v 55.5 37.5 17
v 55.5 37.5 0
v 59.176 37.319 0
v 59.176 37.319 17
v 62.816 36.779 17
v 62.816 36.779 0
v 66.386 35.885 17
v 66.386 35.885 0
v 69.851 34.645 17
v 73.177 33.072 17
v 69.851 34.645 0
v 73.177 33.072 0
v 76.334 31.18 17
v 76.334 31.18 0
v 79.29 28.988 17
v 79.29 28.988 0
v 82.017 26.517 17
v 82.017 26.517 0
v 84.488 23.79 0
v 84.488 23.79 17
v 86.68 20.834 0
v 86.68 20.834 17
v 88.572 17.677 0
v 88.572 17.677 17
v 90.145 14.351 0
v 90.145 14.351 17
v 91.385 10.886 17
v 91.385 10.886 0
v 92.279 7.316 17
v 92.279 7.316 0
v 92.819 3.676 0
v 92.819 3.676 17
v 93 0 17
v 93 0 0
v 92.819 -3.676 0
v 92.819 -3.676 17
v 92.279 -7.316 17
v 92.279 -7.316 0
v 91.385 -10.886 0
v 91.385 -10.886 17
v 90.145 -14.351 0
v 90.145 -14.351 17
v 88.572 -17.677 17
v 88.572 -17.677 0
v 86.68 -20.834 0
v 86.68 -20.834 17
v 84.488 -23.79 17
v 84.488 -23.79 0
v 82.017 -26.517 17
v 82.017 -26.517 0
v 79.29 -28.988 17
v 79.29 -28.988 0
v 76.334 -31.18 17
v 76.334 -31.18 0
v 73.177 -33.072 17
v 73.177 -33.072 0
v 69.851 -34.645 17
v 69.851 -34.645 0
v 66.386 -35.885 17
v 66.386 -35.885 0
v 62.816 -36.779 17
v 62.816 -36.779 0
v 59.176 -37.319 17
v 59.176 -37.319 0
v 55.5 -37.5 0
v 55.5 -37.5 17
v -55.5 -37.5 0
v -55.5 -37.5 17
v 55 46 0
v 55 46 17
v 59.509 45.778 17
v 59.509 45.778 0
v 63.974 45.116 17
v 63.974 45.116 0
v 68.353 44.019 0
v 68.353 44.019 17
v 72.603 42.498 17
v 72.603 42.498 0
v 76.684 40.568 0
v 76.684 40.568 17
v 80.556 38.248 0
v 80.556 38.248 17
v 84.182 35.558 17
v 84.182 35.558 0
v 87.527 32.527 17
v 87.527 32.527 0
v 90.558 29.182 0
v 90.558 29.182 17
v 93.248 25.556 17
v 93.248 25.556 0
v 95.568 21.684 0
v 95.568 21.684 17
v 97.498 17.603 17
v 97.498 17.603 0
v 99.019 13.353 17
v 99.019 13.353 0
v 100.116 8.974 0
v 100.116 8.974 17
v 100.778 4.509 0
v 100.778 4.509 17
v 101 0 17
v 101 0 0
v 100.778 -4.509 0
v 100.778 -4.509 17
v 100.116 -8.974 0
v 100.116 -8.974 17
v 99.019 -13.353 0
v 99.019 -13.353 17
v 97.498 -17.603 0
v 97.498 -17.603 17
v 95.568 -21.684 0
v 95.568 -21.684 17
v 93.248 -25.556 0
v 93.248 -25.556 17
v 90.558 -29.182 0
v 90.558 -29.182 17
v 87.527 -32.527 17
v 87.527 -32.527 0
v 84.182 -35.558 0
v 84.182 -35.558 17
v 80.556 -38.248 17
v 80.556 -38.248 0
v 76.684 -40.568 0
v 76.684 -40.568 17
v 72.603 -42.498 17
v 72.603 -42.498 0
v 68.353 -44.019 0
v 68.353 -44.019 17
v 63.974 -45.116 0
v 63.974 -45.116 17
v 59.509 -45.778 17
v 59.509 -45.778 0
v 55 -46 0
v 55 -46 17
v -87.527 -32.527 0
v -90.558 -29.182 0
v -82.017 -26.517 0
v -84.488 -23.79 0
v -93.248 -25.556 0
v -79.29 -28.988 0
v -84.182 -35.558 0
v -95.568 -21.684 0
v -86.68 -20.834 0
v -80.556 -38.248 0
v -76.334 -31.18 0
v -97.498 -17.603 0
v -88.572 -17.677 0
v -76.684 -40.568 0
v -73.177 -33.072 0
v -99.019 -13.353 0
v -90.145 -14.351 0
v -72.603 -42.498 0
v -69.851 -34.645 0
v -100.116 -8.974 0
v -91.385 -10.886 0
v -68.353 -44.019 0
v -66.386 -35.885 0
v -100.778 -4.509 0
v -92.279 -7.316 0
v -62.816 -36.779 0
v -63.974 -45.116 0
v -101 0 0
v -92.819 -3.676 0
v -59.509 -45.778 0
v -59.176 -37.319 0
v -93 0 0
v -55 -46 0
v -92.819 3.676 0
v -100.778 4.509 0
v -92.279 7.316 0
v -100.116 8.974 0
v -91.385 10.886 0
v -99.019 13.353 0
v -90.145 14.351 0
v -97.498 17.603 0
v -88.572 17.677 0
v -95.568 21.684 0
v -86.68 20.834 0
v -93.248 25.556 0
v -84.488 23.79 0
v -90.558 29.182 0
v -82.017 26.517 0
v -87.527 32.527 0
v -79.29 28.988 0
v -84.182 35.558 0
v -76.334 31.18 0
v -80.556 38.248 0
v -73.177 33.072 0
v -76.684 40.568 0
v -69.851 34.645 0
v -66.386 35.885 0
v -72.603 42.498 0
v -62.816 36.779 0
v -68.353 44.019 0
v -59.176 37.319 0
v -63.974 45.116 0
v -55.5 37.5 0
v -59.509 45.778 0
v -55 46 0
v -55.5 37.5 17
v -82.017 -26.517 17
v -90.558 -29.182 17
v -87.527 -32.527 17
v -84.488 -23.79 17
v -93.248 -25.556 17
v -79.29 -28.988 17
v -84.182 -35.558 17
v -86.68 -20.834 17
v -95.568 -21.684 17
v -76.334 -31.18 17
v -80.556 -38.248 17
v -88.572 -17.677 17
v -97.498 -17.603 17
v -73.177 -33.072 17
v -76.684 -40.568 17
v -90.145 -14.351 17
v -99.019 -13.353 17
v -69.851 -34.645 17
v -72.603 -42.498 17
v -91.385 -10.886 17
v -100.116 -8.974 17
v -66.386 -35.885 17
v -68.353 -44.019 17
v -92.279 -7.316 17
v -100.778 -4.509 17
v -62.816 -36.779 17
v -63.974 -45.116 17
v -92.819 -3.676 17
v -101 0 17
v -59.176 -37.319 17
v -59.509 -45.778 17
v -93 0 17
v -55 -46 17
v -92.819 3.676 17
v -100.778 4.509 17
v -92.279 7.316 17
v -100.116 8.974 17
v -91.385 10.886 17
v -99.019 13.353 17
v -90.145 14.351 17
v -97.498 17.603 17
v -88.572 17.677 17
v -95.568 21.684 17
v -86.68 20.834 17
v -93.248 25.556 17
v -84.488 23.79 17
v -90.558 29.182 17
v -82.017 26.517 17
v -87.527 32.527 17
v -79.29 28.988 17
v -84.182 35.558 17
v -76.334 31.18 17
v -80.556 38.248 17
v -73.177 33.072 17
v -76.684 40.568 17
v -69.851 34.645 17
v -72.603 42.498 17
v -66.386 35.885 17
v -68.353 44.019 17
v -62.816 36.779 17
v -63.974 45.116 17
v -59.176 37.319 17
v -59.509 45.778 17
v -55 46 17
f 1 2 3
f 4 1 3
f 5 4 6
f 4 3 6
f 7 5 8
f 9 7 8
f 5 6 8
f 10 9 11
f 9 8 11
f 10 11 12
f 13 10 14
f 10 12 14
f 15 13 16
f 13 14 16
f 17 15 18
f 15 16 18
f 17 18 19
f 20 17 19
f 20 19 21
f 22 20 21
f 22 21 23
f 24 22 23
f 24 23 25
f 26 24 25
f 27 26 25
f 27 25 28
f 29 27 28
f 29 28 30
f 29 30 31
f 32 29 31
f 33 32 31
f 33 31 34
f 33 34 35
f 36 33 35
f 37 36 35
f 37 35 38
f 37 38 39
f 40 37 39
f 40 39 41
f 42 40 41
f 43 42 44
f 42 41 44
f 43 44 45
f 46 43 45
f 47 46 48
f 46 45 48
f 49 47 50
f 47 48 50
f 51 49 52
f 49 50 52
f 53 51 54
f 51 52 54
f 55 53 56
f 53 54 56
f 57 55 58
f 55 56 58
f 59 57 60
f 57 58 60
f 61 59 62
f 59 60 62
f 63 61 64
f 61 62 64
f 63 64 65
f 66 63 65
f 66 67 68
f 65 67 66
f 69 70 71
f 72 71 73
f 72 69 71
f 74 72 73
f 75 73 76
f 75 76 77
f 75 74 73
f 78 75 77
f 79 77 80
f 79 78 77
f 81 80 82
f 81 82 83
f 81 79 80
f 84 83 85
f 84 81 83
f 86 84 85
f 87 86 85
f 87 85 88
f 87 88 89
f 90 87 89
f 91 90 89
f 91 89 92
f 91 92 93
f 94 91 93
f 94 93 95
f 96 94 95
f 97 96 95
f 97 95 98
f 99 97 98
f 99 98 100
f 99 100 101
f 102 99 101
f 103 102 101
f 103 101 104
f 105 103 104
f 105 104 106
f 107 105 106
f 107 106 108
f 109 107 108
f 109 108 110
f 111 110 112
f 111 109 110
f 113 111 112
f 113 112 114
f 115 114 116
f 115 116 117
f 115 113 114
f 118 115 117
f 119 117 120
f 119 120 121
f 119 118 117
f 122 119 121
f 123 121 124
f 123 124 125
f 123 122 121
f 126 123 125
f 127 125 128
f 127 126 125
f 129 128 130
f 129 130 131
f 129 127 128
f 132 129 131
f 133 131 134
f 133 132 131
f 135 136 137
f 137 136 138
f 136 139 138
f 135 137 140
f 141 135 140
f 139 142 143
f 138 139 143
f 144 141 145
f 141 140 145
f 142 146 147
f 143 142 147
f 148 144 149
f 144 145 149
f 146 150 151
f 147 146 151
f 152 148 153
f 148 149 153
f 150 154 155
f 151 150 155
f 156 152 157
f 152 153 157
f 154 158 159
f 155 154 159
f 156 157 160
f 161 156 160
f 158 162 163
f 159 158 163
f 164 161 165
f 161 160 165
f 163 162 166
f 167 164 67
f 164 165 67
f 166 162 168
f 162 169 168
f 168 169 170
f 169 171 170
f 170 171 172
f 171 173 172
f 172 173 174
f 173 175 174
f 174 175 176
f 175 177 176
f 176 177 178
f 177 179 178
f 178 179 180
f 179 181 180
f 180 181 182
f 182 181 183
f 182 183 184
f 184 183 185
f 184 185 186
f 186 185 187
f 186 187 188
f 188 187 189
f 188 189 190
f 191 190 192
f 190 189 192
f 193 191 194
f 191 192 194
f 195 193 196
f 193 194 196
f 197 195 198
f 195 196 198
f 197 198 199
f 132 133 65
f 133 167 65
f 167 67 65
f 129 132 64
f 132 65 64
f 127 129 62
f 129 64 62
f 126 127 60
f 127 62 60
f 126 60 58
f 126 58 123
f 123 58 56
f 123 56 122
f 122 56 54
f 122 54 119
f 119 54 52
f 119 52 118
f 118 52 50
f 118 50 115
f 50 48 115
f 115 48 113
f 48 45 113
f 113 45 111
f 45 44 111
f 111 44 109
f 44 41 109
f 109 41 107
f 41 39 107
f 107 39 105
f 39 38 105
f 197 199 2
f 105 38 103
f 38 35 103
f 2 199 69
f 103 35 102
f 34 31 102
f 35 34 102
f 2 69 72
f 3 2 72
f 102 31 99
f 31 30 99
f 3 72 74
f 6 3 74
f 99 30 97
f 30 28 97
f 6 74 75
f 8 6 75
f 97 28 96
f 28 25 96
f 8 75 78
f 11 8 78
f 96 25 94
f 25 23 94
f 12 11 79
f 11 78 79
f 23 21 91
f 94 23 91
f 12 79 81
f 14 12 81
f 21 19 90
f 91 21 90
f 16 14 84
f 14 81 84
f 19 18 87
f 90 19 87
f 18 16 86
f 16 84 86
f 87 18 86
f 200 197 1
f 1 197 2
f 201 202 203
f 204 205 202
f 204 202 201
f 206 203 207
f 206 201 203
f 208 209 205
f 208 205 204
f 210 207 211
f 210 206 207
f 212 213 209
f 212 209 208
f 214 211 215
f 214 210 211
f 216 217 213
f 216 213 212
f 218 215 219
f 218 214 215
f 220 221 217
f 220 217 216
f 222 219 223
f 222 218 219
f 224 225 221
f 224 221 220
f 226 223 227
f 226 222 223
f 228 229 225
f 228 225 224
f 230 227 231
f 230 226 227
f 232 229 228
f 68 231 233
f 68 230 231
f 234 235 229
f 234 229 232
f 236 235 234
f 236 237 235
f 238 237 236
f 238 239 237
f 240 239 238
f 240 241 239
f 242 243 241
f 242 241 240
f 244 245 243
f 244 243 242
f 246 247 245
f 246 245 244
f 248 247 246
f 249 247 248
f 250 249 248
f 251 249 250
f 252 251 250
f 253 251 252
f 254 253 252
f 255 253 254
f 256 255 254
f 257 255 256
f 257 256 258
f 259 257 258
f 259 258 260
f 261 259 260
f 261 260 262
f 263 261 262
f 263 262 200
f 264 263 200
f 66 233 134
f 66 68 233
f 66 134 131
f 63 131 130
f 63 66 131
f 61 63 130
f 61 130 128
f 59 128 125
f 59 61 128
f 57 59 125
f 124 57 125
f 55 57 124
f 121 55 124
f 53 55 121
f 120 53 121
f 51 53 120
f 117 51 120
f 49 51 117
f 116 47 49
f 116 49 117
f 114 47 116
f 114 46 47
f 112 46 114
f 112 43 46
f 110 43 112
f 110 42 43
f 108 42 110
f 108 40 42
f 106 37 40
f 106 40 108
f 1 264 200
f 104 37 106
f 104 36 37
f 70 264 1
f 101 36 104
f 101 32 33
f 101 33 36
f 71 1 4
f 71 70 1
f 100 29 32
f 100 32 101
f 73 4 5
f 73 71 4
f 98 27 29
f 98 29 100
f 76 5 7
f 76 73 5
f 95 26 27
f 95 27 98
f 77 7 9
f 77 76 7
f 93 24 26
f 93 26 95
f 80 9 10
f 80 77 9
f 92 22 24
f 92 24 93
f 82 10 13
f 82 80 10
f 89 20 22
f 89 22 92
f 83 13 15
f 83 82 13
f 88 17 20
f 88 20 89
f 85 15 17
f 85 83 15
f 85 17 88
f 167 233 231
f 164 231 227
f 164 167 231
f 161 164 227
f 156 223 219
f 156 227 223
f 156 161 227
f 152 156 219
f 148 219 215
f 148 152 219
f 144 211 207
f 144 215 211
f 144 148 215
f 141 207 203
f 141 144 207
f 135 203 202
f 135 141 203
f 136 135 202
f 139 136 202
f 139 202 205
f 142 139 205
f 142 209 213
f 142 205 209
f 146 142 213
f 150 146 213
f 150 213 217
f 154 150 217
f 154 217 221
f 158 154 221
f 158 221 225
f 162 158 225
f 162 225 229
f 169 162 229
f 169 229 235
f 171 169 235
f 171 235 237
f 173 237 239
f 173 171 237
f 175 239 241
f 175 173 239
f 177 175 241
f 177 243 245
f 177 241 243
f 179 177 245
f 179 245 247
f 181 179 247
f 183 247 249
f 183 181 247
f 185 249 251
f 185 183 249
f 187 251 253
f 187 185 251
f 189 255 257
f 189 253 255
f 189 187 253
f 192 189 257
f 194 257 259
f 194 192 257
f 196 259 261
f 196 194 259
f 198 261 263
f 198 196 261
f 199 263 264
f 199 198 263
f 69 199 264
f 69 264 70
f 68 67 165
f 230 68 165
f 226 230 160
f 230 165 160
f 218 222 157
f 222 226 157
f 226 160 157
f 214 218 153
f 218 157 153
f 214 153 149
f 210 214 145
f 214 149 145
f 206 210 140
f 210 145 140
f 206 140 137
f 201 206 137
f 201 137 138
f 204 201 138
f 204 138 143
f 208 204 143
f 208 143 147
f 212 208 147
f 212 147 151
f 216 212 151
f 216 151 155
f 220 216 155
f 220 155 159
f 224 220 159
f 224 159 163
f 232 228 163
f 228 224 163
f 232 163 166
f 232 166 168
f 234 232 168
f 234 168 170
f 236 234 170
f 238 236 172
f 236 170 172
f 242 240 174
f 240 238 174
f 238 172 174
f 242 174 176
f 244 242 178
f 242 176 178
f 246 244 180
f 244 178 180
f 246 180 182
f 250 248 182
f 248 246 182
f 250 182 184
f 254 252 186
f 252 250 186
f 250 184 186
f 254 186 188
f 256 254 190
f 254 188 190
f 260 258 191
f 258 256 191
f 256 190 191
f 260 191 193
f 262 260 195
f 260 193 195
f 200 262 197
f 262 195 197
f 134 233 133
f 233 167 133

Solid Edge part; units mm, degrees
sketch "Sketch1" plane through (0, 0, 0) normal (0, 0, 1) x (1, 0, 0)
  line L0 (-55, -46) -> (55, -46)
  arc A0 (55, 46) -> (55, -46) centre (55, 0) cw
  line L1 (-55, 46) -> (55, 46)
  arc A1 (-55, 46) -> (-55, -46) centre (-55, 0) ccw
  line L2 (-55.5, 37.5) -> (55.5, 37.5)
  arc A2 (55.5, 37.5) -> (55.5, -37.5) centre (55.5, 0) cw
  line L3 (-55.5, -37.5) -> (55.5, -37.5)
  arc A3 (-55.5, 37.5) -> (-55.5, -37.5) centre (-55.5, 0) ccw
  dimension "D1" = 46
  dimension "D2" = 46
  dimension "D3" = 110
  dimension "D4" = 110
  dimension "D5" = 37.5
  dimension "D6" = 37.5
extrude "Protrusion1" add sketch "Sketch1" along normal blind 17
